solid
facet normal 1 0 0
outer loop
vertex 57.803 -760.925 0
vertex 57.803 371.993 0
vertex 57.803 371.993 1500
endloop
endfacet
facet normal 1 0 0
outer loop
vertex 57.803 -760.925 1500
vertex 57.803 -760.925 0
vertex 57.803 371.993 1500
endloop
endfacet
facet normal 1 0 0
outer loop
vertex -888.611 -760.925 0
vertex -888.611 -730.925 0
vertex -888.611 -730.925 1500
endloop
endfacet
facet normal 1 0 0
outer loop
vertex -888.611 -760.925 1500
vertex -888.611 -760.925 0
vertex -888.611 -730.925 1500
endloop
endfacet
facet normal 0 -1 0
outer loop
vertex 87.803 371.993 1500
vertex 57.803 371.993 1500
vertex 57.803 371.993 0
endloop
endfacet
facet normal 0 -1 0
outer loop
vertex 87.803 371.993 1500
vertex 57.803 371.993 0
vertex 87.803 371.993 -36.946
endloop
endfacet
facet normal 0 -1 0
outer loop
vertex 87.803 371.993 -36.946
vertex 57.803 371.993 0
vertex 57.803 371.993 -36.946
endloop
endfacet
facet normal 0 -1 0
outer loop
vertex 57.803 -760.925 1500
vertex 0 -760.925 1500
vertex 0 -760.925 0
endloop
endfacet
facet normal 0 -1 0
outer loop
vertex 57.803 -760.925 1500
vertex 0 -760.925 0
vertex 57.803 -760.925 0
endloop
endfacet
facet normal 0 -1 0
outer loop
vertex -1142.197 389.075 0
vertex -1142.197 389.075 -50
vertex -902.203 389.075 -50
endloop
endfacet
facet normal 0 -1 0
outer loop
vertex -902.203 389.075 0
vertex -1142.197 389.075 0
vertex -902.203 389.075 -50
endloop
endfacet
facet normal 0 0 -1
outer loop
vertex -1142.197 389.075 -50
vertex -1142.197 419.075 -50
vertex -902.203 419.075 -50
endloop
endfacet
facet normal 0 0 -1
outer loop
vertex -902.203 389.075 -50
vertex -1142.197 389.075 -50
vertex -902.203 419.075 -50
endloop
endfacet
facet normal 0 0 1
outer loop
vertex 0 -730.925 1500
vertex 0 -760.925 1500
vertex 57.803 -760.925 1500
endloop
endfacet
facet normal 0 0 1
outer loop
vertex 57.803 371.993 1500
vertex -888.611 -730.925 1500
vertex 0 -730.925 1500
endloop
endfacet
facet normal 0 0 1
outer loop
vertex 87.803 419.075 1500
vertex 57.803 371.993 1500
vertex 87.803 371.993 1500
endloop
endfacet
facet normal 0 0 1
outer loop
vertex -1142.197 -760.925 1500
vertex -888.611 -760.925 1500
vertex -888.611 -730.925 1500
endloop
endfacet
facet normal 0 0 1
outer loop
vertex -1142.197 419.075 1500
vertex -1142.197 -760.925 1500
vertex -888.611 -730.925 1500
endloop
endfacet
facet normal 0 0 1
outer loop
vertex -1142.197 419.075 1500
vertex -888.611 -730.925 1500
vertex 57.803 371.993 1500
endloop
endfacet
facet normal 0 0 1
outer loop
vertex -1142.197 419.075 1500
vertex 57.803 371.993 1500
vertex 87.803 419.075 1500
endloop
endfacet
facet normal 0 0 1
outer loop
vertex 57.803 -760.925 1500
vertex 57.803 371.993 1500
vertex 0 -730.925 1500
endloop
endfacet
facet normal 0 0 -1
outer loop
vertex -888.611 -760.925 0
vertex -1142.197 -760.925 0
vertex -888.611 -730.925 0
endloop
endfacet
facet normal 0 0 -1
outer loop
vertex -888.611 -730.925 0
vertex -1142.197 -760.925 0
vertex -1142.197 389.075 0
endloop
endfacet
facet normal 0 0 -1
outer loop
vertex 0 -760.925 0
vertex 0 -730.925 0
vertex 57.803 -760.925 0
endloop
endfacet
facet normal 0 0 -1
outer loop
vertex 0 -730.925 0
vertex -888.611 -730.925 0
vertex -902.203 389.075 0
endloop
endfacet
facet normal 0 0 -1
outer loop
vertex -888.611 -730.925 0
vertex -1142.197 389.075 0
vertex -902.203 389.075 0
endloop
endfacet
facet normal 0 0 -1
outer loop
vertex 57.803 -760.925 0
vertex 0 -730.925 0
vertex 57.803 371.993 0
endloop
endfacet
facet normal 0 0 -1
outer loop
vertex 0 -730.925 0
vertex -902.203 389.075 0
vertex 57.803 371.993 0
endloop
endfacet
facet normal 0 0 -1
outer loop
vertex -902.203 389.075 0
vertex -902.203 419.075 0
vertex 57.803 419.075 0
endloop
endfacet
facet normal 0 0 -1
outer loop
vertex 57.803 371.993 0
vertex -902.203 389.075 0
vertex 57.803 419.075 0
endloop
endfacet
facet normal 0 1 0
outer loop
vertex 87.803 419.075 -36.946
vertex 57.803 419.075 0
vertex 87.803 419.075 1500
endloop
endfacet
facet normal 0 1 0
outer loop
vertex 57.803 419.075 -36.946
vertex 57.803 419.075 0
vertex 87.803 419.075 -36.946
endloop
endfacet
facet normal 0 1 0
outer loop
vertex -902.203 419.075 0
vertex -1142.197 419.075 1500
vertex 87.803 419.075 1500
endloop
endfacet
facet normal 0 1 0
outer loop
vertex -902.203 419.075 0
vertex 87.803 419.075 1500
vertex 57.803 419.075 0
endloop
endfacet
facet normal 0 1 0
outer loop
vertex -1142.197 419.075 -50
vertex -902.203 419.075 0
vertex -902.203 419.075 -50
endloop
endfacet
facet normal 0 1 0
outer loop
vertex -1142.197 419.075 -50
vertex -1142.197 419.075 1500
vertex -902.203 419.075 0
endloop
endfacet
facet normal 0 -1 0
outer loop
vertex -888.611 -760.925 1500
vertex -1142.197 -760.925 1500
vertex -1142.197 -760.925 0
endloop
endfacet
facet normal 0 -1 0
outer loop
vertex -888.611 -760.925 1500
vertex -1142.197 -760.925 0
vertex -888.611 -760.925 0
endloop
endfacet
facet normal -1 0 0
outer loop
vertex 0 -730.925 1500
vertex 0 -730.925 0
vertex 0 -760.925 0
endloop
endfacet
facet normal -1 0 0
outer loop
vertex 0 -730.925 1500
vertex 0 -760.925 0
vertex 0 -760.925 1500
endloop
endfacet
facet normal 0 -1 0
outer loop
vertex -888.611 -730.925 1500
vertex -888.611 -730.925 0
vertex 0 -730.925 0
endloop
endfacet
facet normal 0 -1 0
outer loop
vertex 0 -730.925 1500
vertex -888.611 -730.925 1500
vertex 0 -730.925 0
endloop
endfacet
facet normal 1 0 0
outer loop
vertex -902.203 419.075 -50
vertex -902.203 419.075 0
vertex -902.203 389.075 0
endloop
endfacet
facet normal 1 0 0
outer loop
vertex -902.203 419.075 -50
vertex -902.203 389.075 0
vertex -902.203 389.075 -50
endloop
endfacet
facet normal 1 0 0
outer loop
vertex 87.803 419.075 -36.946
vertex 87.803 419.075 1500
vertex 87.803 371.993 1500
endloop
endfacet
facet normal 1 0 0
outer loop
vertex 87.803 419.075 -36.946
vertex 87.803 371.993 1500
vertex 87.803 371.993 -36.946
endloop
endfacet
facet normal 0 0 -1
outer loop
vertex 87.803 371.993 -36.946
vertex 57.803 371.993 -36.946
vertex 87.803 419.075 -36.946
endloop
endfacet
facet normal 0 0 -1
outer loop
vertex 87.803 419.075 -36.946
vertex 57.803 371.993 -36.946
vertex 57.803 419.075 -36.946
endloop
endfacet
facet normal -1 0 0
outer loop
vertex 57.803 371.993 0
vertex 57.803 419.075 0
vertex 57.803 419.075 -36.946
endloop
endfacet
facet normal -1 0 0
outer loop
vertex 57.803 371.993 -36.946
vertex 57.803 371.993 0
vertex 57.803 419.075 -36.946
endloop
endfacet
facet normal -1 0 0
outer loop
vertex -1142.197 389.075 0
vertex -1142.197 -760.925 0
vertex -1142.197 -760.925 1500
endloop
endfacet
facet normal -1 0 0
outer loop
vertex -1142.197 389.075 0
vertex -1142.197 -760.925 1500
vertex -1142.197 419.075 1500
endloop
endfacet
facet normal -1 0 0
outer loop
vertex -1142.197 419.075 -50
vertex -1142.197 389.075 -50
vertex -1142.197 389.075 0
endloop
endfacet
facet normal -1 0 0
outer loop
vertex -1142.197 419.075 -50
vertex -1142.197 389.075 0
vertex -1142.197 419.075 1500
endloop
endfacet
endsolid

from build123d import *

# Parameters (mm, degrees)
SKETCH1_W           = 1200
SKETCH1_H           = 1150
BOSS_EXTRUDE1_DEPTH = 1500
SKETCH2_W           = 57.803468208
SKETCH2_H           = 1500
SKETCH2_W_2         = 253.585640565
BOSS_EXTRUDE2_DEPTH = 30
SKETCH3_W           = 1536.946487479
SKETCH3_H           = 47.081819152
BOSS_EXTRUDE3_DEPTH = 30
SKETCH4_W           = 239.993344336
SKETCH4_H           = 1550
BOSS_EXTRUDE5_DEPTH = 30


with BuildPart() as part:
    # Sketch1 → Boss-Extrude1 (new body)
    with BuildSketch(Plane.XY):
        with Locations((-542.196531792, -155.924855491)):
            Rectangle(SKETCH1_W, SKETCH1_H)
    extrude(amount=BOSS_EXTRUDE1_DEPTH)

    # Sketch2 → Boss-Extrude2 (add)
    with BuildSketch(Plane.XZ.offset(730.924855491)):
        with Locations((28.901734104, 750)):
            Rectangle(SKETCH2_W, SKETCH2_H)
        with Locations((-1015.403711509, 750)):
            Rectangle(SKETCH2_W_2, SKETCH2_H)
    extrude(amount=BOSS_EXTRUDE2_DEPTH)

    # Sketch3 → Boss-Extrude3 (add)
    with BuildSketch(Plane(origin=(57.803468208, 0, 0), x_dir=(0, 0, -1), z_dir=(1, 0, 0))):
        with Locations((-731.52675626, 395.534234933)):
            Rectangle(SKETCH3_W, SKETCH3_H)
    extrude(amount=BOSS_EXTRUDE3_DEPTH)

    # Sketch4 → Boss-Extrude5 (add)
    with BuildSketch(Plane(origin=(0, 419.075144509, 0), x_dir=(1, 0, 0), z_dir=(0, 1, 0))):
        with Locations((-1022.199859624, -725)):
            Rectangle(SKETCH4_W, SKETCH4_H)
    extrude(amount=-BOSS_EXTRUDE5_DEPTH)


solid = part.part
